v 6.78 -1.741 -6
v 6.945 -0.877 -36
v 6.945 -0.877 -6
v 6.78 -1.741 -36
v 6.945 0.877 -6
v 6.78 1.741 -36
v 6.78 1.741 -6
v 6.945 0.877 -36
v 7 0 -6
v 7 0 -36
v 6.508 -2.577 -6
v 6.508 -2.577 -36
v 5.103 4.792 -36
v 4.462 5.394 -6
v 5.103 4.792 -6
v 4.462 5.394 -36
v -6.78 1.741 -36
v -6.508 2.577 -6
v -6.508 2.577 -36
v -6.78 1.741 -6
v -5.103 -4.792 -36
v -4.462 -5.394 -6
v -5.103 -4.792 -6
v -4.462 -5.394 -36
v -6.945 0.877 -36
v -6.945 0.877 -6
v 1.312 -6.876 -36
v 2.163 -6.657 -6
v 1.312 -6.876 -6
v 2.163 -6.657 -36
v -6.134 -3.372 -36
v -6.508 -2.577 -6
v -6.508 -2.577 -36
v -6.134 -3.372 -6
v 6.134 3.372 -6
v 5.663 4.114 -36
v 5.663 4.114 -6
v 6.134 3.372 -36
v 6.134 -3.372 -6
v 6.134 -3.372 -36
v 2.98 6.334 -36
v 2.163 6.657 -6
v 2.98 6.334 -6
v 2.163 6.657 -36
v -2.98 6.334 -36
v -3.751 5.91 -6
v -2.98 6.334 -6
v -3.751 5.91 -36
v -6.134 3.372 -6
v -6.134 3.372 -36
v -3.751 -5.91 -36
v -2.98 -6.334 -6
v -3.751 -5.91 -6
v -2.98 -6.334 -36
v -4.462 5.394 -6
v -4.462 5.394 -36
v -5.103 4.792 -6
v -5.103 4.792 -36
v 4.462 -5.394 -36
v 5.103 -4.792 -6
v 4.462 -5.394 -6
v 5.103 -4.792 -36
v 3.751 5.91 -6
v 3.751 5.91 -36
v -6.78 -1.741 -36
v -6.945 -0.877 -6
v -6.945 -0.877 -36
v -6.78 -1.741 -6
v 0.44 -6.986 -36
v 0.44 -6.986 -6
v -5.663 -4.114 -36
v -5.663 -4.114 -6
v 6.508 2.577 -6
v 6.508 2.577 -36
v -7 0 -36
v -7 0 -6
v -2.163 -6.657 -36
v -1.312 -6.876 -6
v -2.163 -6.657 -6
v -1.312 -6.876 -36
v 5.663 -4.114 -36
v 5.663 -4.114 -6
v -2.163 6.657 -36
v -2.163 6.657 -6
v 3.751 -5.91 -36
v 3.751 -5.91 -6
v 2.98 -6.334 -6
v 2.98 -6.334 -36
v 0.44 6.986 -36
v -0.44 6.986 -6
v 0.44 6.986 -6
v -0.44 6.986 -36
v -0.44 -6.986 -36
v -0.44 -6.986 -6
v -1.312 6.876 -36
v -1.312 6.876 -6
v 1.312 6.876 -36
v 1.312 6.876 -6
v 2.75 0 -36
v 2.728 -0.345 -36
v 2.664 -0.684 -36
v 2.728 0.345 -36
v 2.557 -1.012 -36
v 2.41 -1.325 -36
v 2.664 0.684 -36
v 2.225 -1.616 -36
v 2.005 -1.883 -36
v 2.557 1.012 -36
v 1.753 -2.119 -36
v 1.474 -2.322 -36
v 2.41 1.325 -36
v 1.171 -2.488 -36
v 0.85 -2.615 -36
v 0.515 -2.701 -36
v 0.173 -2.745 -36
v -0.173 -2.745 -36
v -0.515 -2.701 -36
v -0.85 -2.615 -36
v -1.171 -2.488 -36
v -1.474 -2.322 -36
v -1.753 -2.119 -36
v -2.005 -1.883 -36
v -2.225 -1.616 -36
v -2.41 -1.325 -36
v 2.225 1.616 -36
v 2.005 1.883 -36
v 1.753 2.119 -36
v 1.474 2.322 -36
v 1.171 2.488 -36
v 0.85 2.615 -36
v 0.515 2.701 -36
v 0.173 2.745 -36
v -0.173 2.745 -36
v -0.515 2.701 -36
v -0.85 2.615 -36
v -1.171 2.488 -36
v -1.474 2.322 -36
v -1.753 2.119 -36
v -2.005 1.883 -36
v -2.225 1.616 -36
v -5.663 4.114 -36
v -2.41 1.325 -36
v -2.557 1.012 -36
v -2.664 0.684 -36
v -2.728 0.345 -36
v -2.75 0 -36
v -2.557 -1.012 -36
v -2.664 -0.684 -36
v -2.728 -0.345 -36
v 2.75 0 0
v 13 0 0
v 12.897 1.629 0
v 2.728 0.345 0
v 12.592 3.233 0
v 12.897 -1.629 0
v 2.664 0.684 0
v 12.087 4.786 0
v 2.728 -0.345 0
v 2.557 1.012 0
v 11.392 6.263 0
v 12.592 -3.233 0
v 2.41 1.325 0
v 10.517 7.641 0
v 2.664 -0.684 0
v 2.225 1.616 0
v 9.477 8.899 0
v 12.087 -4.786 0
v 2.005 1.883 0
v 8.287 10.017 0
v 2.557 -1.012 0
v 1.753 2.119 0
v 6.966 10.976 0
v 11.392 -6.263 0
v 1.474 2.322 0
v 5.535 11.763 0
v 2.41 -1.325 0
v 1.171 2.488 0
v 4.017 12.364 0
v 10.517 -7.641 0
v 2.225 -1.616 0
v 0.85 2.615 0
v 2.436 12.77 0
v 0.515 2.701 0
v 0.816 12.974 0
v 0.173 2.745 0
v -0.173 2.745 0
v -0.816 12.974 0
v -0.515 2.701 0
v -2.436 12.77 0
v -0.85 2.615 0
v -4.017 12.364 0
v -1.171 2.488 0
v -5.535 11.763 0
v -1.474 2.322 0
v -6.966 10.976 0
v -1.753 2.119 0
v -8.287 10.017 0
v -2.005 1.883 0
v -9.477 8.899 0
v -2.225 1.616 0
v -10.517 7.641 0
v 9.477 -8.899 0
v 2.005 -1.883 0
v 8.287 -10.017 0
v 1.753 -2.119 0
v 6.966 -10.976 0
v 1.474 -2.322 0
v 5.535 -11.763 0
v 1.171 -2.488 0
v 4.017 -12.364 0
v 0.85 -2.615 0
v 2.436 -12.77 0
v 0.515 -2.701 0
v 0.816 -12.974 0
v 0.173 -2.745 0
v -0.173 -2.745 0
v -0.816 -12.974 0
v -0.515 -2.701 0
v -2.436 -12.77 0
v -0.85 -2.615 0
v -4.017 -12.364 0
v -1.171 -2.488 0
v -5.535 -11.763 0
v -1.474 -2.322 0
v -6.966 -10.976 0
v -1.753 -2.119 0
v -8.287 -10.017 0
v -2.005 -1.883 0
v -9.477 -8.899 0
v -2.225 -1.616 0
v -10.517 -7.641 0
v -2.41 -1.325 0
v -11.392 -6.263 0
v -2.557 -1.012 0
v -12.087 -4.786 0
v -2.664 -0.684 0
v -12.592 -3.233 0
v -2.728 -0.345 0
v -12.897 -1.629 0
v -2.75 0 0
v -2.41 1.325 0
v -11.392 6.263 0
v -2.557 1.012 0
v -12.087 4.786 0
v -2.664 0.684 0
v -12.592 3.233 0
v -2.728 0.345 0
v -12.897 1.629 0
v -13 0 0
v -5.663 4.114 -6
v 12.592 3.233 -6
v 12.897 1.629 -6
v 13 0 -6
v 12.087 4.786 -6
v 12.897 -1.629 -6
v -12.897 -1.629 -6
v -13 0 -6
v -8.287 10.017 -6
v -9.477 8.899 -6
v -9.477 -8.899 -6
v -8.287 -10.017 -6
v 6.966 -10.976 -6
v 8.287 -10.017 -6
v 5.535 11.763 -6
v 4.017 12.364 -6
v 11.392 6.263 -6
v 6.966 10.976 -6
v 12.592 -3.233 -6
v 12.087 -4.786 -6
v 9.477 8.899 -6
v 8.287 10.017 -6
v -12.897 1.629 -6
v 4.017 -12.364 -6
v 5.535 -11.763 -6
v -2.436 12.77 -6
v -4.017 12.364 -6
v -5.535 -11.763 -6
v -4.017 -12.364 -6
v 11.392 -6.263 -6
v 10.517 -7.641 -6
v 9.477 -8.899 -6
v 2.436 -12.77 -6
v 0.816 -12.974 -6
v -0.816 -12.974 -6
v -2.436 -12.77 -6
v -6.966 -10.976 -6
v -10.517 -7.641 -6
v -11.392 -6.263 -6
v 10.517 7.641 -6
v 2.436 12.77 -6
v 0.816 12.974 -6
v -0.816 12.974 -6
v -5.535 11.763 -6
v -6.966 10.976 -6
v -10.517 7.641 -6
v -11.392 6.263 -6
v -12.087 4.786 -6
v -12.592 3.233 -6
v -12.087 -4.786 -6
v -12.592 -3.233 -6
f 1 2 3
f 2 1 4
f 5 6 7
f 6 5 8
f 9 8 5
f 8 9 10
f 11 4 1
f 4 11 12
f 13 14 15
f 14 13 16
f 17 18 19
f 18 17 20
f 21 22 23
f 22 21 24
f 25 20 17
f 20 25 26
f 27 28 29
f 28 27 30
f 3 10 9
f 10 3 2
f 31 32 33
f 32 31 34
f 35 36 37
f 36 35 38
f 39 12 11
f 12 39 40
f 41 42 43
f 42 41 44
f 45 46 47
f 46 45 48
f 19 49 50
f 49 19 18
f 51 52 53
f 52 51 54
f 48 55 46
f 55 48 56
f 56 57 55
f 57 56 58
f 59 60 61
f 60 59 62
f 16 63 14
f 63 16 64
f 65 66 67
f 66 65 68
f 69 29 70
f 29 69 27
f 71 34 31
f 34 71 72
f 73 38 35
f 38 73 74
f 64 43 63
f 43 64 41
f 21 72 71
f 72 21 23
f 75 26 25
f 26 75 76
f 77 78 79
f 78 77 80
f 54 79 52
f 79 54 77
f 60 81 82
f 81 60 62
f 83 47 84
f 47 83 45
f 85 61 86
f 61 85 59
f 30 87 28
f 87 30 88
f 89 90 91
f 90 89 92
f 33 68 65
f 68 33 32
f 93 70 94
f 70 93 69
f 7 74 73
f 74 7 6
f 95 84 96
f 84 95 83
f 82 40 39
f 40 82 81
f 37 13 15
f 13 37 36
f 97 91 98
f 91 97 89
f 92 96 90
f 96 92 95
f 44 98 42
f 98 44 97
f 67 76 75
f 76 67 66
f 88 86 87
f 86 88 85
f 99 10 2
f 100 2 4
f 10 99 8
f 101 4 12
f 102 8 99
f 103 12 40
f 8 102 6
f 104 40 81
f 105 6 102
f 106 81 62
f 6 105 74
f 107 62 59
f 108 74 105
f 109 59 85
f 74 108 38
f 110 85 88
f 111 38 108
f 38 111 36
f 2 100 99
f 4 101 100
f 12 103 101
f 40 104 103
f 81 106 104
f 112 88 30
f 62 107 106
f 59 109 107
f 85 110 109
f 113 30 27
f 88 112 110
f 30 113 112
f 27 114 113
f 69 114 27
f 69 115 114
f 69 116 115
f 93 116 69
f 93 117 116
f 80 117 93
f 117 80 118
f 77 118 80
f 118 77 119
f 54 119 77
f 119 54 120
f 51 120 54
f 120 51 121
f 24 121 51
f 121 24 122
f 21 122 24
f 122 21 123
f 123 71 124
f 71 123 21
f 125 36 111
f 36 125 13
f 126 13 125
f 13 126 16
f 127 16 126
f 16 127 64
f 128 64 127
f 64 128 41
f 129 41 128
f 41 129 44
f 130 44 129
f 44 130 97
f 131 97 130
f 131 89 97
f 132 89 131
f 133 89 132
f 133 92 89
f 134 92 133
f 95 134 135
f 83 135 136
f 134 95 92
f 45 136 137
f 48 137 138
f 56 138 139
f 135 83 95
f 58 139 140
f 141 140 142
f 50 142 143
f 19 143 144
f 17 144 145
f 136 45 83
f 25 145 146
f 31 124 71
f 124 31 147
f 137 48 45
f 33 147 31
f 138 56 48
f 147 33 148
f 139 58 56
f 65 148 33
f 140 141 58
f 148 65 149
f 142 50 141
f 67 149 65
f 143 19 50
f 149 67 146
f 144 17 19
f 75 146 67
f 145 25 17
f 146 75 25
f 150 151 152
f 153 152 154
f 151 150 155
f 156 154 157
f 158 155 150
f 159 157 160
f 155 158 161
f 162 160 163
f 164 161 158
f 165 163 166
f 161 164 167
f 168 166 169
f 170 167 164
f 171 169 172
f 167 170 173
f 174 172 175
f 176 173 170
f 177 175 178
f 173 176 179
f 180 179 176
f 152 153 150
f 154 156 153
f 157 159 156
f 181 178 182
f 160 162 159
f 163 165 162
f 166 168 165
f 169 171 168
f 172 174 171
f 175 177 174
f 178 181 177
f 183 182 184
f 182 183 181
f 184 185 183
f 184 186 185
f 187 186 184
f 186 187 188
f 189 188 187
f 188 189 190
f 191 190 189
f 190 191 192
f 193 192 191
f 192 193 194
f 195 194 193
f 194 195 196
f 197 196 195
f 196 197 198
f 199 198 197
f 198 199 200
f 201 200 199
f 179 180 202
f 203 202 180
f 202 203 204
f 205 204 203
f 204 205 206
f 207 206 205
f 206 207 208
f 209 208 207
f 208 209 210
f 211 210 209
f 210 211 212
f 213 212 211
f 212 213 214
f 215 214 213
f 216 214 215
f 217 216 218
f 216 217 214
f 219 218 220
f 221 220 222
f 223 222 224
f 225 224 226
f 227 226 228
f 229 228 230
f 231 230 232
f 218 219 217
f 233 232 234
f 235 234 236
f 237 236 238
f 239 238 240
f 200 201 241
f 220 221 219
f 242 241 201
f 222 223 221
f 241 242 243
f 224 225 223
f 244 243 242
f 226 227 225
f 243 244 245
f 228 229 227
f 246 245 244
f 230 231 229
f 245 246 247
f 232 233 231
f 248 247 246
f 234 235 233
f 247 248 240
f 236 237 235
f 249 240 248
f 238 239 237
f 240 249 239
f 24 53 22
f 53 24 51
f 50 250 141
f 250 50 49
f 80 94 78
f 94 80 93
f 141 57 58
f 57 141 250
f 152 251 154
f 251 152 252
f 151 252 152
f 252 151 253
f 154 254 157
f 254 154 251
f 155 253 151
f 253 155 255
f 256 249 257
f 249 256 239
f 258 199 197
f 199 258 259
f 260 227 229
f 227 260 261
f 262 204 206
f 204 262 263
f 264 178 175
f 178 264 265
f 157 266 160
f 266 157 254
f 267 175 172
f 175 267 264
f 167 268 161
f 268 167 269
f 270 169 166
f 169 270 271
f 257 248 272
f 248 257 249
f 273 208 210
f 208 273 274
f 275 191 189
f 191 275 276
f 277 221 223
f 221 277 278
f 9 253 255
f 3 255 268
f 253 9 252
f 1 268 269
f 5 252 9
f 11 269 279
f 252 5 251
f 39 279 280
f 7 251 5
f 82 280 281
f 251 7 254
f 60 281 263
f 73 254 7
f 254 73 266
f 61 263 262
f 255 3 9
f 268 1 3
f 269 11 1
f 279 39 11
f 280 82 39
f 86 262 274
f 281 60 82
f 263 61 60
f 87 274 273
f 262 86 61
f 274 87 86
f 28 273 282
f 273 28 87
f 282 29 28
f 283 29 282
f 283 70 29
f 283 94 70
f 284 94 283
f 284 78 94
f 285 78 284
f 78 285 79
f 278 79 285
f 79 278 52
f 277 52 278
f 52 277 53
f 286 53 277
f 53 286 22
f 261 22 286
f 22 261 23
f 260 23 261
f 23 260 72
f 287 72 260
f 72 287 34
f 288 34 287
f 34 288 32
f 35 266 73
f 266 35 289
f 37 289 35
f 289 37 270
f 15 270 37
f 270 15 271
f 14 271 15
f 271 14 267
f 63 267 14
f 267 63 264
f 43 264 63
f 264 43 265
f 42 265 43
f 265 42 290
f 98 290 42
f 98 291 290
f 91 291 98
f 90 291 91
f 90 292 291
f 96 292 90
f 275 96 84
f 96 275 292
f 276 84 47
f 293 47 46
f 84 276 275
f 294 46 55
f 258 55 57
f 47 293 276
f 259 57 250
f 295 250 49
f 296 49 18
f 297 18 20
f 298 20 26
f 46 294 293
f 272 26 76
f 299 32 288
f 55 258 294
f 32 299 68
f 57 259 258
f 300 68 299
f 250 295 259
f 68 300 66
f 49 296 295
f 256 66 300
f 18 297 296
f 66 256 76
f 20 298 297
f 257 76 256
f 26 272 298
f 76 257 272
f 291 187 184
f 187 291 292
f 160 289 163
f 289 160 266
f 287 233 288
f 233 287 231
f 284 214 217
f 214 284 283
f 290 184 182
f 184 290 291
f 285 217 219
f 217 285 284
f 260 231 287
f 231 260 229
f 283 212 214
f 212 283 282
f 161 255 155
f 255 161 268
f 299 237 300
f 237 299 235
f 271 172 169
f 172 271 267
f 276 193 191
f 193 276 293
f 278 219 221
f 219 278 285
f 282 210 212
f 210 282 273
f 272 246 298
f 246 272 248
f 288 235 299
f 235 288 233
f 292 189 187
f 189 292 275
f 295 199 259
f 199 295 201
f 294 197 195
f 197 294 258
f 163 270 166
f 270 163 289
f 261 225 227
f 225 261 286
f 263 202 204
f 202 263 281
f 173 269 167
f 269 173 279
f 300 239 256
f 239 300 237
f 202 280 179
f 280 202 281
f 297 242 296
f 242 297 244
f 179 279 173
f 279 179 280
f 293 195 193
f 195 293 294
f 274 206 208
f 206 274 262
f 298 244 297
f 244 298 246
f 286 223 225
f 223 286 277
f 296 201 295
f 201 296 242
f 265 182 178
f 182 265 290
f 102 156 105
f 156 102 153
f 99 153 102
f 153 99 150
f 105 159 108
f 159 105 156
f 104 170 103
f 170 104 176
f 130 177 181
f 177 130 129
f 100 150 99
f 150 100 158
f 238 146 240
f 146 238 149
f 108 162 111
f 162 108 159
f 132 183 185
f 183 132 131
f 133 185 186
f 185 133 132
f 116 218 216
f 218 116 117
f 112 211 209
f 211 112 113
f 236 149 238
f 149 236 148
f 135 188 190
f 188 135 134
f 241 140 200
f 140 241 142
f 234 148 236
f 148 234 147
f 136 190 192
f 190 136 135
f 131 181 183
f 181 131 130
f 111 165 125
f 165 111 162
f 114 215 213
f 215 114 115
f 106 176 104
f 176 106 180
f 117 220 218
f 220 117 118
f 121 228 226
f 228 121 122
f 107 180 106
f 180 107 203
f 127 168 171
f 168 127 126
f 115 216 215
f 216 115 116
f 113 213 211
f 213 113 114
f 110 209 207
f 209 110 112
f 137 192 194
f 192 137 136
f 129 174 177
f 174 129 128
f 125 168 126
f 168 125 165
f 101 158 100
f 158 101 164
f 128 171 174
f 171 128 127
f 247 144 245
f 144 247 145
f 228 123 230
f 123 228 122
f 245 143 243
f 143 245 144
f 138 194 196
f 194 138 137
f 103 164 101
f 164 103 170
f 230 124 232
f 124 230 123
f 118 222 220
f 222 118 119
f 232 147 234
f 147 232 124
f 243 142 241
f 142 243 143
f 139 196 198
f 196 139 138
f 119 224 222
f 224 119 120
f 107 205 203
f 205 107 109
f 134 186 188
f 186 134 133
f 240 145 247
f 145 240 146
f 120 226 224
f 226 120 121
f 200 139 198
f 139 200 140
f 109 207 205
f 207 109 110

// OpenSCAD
$fn = 50;


difference() {
	union() {
		translate(v = [0, 0, -36.0000000000]) {
			cylinder(h = 36, r = 7.0000000000);
		}
		translate(v = [0, 0, -6.0000000000]) {
			cylinder(h = 6, r = 13.0000000000);
		}
	}
	union() {
		#translate(v = [0, 0, -36]) {
			cylinder(h = 36, r = 2.7500000000);
		}
	}
}
